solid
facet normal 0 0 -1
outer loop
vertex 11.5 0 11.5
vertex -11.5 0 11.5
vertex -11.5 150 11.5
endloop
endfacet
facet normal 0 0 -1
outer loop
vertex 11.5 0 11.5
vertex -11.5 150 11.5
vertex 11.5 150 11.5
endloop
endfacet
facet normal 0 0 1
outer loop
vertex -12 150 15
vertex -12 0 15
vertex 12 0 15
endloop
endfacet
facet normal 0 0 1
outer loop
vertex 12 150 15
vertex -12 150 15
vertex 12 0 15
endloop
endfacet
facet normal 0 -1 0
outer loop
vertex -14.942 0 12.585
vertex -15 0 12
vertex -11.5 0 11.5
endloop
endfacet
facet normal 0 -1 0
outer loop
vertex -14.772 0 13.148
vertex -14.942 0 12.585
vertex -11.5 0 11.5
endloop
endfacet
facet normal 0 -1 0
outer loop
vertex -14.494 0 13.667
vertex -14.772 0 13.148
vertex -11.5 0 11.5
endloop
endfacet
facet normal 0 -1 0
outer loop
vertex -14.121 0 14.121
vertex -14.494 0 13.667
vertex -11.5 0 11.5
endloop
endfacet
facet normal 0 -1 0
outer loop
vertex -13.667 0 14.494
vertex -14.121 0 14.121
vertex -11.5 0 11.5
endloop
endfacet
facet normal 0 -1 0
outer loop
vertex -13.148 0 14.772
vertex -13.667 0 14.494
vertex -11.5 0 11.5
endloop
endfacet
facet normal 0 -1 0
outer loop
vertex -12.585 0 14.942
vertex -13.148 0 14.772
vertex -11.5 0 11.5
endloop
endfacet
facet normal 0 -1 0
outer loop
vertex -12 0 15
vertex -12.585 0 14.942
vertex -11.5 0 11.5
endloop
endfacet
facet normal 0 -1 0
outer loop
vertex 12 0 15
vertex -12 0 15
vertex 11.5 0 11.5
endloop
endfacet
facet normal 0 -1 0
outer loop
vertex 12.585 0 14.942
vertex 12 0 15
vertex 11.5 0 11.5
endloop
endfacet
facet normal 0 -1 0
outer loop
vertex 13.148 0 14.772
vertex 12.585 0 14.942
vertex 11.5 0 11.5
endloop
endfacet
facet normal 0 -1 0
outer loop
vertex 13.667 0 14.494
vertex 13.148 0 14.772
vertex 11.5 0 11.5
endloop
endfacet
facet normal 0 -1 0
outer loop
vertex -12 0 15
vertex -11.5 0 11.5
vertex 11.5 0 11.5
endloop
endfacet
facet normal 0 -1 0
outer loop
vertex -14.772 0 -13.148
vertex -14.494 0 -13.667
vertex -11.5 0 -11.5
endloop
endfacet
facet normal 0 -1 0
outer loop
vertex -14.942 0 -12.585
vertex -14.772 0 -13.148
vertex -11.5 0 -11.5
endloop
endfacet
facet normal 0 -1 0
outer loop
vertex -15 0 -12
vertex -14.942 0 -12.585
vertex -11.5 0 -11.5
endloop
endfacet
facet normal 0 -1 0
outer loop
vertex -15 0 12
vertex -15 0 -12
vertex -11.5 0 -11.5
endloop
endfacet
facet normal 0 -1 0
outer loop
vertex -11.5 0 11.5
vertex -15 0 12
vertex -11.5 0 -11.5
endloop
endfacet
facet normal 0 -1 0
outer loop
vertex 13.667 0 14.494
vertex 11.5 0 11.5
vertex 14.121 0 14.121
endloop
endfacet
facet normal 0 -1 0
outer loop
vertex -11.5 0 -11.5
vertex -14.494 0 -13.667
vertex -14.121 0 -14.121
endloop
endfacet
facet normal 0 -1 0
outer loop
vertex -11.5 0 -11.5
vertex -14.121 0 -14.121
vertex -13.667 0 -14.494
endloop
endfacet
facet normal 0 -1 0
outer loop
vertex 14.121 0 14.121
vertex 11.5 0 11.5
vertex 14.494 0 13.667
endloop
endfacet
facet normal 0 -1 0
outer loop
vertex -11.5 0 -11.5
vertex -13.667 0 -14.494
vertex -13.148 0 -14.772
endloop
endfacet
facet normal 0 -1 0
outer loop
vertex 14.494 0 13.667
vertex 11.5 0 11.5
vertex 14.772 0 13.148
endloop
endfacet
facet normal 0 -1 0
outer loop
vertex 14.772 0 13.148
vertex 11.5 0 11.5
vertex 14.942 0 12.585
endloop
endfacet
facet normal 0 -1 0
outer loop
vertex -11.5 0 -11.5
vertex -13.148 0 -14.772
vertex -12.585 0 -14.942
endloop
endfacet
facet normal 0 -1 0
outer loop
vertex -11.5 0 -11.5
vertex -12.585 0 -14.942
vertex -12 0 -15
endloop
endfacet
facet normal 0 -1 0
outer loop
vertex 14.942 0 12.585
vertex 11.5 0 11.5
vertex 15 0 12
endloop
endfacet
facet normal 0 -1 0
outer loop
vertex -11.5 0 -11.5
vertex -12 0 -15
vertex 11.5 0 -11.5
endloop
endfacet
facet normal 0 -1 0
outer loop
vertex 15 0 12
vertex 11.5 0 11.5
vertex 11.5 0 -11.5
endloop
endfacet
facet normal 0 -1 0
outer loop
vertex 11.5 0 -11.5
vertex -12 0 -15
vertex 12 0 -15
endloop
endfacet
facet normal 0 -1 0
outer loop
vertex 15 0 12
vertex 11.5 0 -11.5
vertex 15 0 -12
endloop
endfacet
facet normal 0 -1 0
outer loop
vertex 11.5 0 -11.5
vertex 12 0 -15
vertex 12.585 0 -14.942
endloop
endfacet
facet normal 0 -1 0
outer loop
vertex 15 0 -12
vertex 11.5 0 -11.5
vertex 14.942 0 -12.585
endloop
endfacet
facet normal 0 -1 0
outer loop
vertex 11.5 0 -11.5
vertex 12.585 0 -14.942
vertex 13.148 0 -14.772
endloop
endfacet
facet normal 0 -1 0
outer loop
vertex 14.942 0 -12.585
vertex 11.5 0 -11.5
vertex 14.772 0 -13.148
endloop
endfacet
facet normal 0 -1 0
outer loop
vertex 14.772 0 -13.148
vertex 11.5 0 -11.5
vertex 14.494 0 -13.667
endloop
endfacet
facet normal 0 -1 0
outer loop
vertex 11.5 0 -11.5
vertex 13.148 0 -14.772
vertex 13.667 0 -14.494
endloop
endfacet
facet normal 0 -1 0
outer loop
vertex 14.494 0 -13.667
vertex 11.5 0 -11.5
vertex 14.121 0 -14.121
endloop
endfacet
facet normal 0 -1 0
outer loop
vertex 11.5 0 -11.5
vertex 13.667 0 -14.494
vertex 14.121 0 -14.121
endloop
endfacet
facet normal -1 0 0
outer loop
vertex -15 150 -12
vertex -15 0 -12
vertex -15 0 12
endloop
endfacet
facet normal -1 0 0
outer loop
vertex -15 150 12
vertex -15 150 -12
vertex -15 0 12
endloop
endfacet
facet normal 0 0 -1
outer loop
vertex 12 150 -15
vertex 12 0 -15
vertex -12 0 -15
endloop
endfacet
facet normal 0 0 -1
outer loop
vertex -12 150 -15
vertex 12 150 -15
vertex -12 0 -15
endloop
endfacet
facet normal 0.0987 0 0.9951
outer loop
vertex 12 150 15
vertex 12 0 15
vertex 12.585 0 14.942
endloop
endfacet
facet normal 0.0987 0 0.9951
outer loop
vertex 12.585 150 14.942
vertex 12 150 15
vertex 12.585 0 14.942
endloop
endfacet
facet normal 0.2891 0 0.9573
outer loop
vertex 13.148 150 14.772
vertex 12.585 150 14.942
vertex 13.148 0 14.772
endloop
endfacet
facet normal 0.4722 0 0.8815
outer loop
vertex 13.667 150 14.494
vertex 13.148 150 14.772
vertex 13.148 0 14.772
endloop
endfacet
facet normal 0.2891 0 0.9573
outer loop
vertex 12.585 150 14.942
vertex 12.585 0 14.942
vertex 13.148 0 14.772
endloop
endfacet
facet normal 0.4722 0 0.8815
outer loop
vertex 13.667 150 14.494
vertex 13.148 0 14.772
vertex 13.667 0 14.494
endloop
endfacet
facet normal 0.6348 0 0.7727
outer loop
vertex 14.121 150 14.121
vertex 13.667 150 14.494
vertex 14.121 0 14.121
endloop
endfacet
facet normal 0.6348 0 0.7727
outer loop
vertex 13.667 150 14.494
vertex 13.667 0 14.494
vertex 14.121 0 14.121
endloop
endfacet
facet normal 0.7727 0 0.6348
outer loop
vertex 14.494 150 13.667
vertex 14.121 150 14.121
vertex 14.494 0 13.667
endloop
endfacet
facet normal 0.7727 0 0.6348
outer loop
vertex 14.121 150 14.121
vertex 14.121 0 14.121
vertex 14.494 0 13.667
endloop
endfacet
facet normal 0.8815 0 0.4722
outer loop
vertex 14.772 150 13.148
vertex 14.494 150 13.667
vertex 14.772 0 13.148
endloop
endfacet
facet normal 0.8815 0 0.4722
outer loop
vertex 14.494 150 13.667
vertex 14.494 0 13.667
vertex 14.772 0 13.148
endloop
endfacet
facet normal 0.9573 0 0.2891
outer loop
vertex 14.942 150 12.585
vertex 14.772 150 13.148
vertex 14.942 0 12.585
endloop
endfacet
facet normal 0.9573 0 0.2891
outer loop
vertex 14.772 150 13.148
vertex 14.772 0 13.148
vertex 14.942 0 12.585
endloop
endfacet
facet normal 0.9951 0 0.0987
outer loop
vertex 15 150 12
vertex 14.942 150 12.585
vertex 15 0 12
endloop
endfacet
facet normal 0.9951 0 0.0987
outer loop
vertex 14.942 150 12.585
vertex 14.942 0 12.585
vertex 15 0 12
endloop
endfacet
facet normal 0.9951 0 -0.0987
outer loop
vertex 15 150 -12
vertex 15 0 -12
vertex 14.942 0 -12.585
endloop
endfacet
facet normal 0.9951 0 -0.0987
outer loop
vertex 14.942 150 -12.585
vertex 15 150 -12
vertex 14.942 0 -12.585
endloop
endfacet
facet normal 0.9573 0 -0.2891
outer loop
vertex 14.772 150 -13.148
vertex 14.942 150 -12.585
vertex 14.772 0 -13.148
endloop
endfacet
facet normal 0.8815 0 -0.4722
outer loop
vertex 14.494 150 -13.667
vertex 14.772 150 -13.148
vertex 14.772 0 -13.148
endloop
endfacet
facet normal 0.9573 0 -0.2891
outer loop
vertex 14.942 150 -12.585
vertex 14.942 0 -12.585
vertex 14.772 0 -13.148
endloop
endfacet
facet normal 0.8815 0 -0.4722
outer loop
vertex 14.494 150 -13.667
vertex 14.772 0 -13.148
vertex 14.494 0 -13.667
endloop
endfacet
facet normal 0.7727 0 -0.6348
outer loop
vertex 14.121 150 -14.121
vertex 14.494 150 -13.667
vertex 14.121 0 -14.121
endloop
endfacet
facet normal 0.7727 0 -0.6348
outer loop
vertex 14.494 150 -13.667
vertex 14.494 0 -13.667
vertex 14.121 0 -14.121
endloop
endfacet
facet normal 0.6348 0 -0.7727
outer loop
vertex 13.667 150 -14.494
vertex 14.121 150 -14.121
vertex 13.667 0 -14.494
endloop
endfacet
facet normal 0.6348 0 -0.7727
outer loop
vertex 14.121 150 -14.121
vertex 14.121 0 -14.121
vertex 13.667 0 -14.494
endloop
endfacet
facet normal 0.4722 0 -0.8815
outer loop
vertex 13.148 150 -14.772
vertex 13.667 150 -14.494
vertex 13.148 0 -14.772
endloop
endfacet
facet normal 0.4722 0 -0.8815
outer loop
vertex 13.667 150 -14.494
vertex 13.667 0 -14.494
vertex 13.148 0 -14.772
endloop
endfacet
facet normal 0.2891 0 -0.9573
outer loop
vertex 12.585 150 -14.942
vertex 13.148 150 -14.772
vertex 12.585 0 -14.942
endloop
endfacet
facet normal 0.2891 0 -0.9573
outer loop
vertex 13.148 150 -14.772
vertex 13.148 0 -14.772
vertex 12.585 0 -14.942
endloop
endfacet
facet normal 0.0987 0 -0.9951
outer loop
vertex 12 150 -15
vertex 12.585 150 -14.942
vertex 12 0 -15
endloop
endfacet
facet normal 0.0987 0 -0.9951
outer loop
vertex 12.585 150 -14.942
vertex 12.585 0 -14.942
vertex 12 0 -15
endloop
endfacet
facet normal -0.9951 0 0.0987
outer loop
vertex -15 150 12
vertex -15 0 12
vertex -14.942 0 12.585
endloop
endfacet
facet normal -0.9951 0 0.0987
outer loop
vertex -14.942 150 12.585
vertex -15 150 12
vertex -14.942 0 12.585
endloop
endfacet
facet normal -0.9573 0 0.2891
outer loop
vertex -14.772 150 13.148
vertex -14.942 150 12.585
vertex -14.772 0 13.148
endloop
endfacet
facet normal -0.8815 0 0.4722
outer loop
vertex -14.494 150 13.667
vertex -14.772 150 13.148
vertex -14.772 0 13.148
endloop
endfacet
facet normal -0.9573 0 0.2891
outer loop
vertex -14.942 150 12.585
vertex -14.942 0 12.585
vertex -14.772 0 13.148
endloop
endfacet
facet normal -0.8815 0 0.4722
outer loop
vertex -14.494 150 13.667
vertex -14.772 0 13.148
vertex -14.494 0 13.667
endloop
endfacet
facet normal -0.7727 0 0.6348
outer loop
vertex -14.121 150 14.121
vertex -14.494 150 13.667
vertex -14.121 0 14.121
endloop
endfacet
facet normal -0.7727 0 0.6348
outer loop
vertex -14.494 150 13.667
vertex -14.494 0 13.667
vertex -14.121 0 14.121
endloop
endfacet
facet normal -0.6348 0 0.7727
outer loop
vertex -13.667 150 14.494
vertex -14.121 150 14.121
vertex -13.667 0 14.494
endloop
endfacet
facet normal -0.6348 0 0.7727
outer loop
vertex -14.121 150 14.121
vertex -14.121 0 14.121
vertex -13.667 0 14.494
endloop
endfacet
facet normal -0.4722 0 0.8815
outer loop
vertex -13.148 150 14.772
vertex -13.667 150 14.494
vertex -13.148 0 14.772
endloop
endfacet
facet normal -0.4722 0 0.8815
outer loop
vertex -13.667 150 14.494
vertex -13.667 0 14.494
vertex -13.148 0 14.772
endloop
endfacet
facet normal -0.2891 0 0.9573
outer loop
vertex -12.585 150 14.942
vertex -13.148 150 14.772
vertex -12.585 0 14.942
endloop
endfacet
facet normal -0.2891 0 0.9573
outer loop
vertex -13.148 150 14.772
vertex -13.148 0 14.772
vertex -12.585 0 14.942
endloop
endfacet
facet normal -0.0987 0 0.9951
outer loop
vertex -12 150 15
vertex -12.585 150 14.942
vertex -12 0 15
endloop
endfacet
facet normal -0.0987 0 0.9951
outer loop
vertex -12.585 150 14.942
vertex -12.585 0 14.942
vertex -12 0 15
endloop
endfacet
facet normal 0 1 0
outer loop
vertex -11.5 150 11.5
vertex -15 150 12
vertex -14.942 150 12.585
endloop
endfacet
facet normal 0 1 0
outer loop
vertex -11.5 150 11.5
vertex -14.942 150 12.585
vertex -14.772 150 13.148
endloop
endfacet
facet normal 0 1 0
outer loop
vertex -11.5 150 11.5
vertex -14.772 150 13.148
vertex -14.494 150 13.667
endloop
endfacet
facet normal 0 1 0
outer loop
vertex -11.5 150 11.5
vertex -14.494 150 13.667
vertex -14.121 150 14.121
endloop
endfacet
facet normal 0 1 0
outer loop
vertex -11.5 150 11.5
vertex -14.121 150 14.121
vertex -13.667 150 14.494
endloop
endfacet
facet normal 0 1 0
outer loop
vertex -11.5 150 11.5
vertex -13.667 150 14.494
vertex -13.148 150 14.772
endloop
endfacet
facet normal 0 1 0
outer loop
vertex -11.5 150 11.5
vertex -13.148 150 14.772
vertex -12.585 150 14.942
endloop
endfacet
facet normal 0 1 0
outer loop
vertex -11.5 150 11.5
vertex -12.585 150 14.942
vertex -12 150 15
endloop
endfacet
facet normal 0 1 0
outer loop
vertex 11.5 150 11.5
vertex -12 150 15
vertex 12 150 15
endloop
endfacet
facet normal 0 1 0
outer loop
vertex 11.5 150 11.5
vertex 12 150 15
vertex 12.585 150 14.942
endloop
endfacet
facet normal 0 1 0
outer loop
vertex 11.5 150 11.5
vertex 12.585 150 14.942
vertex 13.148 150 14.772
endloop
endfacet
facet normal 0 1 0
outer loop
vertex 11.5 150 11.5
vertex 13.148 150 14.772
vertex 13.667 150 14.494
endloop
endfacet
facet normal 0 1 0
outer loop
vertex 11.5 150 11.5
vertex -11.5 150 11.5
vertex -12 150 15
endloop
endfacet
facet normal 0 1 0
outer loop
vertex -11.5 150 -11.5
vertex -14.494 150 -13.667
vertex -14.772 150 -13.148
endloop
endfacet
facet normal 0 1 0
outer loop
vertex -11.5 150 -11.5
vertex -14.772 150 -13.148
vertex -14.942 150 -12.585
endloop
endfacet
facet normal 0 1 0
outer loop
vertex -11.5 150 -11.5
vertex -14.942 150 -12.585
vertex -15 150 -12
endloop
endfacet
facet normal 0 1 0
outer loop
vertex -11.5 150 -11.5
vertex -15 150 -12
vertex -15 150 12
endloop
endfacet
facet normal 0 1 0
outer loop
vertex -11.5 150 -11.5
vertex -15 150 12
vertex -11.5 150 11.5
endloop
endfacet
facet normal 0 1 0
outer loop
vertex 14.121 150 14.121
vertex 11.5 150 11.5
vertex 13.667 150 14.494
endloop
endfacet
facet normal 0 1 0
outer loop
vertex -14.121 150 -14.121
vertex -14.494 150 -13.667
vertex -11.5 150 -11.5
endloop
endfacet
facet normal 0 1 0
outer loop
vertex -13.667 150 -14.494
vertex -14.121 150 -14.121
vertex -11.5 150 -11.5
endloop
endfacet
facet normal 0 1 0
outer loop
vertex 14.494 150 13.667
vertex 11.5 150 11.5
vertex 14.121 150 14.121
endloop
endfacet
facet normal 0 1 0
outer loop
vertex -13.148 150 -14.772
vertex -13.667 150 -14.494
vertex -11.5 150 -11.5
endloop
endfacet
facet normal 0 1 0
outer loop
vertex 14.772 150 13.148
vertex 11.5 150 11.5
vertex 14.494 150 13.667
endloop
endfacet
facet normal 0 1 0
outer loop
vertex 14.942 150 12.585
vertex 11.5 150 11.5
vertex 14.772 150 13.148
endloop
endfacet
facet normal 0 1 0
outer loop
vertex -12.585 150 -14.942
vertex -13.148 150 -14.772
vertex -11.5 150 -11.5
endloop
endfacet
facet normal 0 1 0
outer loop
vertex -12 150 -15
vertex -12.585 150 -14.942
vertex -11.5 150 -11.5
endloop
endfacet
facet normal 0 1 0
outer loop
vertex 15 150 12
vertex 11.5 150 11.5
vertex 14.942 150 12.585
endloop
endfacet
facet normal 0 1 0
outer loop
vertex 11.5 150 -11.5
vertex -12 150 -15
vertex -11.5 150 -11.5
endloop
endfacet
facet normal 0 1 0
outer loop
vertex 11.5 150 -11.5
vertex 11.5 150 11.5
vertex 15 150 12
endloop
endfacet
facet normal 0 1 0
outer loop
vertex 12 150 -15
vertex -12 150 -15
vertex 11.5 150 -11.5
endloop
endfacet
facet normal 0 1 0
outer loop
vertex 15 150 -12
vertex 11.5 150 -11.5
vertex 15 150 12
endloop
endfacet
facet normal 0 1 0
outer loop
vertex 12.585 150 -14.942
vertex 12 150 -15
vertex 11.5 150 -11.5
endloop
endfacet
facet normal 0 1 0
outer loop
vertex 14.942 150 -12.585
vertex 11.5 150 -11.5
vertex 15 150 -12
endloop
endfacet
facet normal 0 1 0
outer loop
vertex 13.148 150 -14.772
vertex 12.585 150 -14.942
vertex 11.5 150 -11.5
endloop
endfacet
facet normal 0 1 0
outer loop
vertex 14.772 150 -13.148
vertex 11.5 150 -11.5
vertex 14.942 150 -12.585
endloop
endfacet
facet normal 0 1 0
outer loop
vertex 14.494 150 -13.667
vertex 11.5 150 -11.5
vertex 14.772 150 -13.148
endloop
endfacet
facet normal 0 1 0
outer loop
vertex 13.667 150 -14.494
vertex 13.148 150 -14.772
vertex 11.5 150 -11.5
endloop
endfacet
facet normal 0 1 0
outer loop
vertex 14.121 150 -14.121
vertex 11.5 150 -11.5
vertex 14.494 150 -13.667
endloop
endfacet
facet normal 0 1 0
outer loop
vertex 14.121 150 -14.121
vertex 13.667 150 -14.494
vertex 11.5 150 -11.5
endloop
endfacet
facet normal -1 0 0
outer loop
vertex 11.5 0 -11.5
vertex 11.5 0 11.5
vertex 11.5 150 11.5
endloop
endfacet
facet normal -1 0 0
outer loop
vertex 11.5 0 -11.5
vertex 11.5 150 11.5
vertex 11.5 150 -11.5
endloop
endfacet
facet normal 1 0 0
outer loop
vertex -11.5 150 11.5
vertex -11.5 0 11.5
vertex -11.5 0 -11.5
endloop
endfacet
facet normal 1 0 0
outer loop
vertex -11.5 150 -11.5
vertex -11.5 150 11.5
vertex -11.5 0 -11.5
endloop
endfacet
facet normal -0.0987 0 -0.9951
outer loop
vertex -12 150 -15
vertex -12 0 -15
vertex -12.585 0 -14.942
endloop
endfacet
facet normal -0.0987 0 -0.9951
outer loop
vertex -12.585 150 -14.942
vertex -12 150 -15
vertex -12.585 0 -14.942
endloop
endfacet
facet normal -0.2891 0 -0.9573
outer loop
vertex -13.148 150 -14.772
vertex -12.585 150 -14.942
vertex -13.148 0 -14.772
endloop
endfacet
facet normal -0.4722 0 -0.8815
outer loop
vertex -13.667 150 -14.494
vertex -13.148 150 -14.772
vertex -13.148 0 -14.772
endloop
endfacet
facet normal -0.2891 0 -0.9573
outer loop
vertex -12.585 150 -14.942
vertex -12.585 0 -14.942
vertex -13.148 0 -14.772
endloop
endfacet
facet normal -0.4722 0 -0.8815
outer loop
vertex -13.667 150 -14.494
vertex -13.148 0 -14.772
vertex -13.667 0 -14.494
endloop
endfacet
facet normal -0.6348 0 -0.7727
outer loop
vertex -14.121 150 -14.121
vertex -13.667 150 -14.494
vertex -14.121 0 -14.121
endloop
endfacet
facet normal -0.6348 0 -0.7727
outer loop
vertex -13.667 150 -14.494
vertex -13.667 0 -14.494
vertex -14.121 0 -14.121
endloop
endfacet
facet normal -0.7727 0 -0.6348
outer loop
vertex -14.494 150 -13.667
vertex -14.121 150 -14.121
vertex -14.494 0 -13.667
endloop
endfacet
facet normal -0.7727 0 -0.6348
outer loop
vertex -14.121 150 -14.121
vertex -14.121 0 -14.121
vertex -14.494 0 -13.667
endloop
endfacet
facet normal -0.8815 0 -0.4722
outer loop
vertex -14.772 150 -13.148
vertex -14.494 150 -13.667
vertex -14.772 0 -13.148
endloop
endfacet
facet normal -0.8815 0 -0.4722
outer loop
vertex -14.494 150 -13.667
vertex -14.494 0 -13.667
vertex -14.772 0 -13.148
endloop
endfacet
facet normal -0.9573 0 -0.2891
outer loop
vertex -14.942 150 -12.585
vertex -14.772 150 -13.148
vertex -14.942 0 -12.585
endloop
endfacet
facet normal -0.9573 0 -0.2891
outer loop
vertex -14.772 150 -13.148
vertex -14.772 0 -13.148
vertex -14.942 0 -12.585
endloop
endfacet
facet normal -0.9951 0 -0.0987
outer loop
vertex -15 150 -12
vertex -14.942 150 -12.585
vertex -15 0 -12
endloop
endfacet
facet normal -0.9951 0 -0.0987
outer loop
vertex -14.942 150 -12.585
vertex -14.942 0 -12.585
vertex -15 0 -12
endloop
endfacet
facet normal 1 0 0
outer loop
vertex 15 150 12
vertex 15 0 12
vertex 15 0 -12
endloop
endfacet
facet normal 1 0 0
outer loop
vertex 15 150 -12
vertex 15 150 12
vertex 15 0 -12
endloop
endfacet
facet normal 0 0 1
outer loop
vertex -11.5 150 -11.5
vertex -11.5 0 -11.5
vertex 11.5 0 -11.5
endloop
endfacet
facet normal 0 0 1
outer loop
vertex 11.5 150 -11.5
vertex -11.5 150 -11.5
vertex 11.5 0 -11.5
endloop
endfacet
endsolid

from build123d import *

# Parameters (mm, degrees)
SKETCH1_W           = 23
SKETCH1_H           = 23
BOSS_EXTRUDE1_DEPTH = 150


with BuildPart() as part:
    # Sketch1 → Boss-Extrude1 (new body)
    with BuildSketch(Plane(origin=(0, 0, 0), x_dir=(1, 0, 0), z_dir=(0, 1, 0))):
        with BuildLine():
            Line((12, 15), (-12, 15))
            ThreePointArc((-12, 15), (-14.121320344, 14.121320344), (-15, 12))
            Line((-15, 12), (-15, -12))
            ThreePointArc((-15, -12), (-14.121320344, -14.121320344), (-12, -15))
            Line((-12, -15), (12, -15))
            ThreePointArc((12, -15), (14.121320344, -14.121320344), (15, -12))
            Line((15, -12), (15, 12))
            ThreePointArc((15, 12), (14.121320344, 14.121320344), (12, 15))
        make_face()
        Rectangle(SKETCH1_W, SKETCH1_H, mode=Mode.SUBTRACT)
    extrude(amount=BOSS_EXTRUDE1_DEPTH)


solid = part.part
